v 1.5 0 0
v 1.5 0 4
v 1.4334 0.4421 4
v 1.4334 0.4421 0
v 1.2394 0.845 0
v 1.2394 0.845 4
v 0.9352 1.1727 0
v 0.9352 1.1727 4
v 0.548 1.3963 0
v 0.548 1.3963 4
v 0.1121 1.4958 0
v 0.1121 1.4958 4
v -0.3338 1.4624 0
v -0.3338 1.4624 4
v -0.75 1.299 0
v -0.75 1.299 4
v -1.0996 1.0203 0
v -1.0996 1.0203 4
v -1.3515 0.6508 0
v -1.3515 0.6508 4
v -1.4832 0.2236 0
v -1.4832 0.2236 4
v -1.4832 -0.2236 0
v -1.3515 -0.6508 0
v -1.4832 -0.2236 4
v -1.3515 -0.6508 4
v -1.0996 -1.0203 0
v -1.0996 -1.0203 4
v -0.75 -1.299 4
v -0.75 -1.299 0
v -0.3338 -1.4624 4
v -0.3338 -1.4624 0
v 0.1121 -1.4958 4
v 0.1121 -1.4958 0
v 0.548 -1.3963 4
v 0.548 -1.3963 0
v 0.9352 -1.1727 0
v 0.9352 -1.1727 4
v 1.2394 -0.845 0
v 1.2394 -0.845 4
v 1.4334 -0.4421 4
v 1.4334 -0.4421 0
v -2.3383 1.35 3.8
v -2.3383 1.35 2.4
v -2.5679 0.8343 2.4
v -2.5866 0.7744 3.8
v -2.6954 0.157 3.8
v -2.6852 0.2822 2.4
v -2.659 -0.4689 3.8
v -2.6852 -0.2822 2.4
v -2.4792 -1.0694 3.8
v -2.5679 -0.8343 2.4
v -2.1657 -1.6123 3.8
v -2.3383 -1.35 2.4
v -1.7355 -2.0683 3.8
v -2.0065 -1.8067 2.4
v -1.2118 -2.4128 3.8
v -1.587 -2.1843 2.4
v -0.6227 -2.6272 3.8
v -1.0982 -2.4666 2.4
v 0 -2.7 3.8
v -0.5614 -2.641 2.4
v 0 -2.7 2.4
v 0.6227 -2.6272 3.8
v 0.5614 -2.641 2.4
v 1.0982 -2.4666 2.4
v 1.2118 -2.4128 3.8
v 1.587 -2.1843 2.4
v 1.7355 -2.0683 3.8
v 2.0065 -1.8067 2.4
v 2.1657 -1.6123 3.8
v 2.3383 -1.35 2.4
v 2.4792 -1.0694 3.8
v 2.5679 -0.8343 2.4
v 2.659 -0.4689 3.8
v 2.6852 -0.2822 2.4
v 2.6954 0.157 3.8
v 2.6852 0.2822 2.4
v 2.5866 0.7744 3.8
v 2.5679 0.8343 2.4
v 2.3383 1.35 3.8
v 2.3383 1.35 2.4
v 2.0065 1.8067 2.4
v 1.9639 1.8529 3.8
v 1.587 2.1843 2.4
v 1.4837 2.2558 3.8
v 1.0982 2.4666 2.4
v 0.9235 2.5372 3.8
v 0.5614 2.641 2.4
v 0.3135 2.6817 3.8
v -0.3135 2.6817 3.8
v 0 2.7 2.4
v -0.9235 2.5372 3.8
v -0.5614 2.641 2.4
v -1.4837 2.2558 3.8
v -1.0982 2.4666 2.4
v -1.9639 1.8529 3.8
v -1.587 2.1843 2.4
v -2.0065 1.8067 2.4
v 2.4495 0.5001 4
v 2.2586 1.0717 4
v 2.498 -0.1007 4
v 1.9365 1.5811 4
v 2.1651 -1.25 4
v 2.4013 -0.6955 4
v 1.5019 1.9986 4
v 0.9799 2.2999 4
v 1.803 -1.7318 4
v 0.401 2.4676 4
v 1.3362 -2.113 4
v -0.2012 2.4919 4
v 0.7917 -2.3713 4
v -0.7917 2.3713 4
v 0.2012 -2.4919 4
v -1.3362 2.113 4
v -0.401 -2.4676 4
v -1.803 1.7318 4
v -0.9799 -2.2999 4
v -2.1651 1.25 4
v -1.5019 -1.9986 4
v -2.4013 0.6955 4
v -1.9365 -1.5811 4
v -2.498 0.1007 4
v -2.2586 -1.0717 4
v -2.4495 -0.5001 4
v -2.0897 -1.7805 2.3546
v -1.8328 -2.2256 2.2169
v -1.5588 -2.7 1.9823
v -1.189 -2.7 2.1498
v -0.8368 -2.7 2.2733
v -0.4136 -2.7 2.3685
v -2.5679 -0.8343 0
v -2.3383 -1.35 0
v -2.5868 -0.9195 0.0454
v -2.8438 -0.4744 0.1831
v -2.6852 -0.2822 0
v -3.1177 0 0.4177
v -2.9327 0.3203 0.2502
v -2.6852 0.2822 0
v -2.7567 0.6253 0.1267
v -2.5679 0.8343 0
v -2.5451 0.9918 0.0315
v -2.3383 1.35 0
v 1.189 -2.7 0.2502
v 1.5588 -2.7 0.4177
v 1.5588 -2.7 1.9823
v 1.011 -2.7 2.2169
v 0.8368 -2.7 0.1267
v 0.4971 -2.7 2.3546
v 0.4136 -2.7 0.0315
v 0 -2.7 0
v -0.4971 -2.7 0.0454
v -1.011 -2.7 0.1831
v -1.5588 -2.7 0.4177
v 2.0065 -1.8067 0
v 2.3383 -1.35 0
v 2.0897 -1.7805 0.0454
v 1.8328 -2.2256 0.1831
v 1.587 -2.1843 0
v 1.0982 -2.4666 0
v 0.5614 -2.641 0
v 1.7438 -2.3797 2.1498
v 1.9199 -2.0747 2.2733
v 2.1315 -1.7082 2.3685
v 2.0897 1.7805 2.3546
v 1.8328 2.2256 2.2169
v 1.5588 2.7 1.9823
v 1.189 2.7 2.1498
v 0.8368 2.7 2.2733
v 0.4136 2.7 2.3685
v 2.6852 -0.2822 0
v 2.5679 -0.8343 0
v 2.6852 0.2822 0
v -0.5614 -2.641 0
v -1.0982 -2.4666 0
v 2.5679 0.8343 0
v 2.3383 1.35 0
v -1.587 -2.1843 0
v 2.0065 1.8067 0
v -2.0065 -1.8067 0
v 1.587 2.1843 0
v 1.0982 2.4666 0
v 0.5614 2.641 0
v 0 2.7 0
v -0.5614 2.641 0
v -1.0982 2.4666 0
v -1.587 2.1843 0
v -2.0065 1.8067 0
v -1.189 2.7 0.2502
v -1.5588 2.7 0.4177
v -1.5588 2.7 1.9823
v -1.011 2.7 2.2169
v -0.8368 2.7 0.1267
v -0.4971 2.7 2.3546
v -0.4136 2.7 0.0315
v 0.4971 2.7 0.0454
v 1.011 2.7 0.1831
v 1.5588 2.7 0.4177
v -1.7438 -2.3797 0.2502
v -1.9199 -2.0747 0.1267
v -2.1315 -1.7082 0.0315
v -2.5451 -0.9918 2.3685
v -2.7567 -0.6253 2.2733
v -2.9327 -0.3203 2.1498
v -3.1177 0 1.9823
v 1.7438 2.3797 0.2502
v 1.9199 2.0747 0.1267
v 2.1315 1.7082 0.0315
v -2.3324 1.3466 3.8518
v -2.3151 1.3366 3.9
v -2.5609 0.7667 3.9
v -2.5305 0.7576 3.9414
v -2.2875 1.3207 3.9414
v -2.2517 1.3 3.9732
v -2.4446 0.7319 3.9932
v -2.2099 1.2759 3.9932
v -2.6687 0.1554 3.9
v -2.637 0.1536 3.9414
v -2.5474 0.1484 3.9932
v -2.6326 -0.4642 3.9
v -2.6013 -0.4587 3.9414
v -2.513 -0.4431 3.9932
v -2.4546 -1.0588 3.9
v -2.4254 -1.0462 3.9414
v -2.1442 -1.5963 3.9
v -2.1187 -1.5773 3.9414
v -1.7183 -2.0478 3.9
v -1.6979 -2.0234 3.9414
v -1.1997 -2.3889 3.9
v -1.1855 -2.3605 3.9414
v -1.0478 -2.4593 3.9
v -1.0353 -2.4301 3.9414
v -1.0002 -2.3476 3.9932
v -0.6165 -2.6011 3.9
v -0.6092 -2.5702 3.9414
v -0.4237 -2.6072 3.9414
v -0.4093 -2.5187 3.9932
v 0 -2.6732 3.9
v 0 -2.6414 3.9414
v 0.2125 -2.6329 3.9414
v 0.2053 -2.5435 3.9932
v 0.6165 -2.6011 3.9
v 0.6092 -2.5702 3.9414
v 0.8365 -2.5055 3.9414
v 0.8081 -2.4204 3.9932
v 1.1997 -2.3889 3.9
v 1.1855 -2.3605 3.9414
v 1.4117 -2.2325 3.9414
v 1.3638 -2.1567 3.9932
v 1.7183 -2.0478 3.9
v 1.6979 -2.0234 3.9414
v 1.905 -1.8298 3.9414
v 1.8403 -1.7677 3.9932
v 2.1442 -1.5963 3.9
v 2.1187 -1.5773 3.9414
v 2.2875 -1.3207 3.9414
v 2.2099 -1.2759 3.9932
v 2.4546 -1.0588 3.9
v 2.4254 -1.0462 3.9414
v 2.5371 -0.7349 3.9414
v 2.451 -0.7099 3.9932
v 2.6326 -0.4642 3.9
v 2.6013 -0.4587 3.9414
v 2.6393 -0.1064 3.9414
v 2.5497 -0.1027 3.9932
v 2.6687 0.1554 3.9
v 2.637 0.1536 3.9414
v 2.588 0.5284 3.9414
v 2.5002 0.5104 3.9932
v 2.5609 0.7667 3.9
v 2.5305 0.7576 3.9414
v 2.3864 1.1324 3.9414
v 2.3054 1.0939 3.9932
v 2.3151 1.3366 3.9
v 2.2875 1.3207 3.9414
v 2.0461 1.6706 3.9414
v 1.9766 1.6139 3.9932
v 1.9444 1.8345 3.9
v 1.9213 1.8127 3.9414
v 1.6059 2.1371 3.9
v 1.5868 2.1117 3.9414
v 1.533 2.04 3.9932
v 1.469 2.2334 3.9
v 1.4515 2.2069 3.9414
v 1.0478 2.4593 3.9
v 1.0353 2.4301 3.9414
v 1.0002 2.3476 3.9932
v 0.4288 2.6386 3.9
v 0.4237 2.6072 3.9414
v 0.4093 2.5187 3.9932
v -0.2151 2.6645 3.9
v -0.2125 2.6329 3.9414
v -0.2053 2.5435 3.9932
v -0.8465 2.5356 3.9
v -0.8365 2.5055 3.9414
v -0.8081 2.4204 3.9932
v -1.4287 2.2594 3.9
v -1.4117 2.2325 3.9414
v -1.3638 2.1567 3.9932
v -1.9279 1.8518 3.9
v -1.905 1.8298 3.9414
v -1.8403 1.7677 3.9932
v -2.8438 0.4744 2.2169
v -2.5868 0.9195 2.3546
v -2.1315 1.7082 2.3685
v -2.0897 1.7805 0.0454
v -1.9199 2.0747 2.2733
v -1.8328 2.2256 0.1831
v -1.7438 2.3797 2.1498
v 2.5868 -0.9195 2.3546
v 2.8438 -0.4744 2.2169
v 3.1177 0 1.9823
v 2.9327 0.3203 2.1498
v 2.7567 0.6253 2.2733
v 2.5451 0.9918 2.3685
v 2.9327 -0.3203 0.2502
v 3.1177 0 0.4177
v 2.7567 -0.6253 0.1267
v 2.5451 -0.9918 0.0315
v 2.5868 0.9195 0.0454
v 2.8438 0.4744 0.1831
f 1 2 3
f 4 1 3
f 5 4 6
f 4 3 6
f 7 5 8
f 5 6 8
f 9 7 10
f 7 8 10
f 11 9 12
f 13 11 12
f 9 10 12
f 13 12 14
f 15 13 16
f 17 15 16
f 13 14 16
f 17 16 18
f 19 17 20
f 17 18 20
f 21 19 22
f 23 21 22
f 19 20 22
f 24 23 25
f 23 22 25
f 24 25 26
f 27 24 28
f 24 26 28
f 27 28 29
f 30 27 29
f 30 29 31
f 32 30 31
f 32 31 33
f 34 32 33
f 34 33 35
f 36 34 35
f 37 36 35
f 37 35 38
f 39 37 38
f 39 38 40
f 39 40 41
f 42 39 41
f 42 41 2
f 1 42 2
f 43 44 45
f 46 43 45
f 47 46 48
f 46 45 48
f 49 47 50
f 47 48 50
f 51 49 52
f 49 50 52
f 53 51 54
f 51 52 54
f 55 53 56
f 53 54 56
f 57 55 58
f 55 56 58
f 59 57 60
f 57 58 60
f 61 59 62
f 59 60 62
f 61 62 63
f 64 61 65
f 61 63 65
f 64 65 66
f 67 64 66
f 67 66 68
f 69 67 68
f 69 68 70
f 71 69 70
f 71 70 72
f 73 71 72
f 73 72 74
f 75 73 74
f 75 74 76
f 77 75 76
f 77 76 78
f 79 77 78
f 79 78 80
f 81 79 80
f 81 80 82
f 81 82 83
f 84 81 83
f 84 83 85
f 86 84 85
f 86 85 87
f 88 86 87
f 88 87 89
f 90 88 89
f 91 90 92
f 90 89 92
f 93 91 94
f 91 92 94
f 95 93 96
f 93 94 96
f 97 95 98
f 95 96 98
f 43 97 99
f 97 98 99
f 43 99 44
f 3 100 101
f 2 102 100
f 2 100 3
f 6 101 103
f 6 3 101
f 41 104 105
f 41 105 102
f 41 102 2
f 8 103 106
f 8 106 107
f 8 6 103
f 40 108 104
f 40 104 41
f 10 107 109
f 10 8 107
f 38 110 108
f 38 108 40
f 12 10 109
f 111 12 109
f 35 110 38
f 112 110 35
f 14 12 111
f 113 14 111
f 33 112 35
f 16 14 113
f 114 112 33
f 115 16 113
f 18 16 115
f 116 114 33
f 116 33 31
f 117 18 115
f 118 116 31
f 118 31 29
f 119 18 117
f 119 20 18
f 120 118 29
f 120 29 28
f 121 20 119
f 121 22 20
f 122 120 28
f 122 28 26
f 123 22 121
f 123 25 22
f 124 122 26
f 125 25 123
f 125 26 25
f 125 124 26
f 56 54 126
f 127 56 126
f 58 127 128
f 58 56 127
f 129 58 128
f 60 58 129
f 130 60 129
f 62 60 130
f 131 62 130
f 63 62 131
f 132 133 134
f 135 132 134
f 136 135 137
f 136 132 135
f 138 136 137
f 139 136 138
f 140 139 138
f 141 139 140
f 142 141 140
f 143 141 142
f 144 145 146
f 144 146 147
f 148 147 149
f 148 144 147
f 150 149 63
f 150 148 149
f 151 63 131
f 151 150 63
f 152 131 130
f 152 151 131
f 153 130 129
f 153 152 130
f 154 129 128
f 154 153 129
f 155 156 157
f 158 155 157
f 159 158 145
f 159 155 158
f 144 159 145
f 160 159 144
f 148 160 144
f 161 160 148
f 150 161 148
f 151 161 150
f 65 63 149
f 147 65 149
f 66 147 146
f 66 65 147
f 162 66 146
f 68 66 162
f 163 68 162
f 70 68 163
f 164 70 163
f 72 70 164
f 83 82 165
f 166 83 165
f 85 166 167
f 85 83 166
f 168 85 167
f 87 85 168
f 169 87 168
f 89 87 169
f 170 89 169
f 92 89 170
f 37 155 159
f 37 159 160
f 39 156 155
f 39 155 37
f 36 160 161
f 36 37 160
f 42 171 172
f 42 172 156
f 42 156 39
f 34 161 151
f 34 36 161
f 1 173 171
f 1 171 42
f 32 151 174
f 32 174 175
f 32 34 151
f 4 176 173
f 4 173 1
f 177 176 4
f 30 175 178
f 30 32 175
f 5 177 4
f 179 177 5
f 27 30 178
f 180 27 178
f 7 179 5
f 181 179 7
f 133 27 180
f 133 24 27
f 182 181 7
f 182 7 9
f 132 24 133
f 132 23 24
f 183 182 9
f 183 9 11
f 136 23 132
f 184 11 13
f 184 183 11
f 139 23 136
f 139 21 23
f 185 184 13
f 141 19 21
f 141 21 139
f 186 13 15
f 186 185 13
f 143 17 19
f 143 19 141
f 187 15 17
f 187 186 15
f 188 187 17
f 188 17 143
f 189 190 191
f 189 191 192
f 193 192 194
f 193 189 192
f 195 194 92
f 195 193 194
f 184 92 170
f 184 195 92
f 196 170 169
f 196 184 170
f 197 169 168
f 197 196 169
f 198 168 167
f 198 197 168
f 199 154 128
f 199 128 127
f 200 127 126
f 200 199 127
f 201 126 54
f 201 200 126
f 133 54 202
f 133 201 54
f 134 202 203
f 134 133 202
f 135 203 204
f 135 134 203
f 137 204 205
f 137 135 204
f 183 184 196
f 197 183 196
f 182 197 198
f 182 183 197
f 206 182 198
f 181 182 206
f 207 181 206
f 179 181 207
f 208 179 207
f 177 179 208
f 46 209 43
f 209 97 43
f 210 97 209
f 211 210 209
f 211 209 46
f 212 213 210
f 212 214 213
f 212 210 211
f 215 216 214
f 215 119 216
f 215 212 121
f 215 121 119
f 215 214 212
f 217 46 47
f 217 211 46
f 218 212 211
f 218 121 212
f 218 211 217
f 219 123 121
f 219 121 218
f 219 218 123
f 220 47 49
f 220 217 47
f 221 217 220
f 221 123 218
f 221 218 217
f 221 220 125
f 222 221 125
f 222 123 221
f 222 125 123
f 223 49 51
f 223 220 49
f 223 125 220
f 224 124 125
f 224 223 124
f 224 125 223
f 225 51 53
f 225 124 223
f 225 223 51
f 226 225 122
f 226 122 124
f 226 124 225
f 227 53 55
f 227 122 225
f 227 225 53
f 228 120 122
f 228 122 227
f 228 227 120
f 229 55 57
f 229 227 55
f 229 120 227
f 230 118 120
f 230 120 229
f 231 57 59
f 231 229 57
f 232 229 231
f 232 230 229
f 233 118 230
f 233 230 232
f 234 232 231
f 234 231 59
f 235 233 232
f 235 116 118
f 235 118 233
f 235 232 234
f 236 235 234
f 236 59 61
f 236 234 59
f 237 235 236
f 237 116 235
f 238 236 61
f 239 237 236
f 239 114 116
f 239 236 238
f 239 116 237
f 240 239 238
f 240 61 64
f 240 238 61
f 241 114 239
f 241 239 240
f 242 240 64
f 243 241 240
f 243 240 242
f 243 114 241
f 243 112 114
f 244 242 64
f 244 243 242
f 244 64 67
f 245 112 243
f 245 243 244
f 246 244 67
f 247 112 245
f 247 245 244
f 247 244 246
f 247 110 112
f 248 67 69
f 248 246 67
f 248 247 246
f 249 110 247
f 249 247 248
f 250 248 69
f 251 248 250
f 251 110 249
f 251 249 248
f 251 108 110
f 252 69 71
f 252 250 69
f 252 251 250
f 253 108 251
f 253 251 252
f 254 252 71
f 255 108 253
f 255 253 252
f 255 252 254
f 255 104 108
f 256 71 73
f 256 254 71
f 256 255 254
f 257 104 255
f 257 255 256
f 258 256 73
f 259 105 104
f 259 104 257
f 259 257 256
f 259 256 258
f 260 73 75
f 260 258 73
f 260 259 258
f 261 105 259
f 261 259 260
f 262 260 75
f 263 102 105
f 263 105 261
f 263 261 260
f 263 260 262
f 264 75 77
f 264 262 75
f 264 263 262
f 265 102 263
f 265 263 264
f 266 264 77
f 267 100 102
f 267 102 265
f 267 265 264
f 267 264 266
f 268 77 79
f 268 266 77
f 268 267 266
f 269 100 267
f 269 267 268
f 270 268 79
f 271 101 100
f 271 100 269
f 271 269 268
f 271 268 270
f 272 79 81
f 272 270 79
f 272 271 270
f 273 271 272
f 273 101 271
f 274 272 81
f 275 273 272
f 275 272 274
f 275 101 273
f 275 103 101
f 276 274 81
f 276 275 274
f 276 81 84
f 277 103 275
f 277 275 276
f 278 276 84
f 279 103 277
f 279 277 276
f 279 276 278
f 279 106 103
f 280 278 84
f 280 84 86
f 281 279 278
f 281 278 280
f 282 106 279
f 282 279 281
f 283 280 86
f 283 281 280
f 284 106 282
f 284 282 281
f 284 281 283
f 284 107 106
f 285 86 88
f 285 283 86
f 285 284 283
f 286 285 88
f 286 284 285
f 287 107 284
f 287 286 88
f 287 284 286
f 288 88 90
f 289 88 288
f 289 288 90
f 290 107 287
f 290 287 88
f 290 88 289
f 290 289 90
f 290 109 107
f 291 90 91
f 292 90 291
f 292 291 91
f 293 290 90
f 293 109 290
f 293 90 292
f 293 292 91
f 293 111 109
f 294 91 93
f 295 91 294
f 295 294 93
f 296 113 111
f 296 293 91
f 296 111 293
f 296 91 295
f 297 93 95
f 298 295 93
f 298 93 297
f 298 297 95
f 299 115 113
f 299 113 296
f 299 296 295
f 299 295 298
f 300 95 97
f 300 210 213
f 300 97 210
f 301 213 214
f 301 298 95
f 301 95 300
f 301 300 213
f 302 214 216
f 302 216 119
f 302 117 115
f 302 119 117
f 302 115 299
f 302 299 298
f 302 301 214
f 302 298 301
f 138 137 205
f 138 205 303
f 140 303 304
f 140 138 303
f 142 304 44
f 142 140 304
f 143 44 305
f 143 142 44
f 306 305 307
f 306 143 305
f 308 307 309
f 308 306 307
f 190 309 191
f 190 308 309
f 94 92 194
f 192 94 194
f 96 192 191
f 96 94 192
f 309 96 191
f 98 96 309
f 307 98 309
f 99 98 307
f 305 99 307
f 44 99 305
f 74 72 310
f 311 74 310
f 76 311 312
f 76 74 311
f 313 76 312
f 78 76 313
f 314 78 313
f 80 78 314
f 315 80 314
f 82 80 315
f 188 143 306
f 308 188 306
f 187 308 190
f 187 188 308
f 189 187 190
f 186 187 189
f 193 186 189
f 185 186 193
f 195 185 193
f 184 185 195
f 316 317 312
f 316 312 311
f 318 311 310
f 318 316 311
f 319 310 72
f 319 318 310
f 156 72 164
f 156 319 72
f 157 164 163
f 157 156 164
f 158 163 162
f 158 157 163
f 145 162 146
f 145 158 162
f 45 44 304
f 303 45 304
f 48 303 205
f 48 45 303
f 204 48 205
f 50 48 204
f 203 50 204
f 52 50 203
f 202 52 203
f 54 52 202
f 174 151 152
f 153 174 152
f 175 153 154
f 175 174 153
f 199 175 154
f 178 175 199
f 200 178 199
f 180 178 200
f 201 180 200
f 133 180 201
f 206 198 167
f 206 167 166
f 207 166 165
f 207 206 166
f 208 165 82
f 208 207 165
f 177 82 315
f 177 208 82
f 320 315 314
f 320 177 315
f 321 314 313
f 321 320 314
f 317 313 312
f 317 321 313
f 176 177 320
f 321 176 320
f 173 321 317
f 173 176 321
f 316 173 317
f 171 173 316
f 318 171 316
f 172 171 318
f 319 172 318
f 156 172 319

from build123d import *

# Parameters (mm, degrees)
EXTRUDE_1_DEPTH     = 2.4
SKETCH_2_OUTSIDE_W  = 17.954
SKETCH_2_OUTSIDE_H  = 17.118
SKETCH_2_OUTSIDE_R  = 2.7
CUT_EXTRUDE_1_DEPTH = 4
CUT_EXTRUDE_1_DRAFT = -45
SKETCH_3_OUTSIDE_W  = 17.954
SKETCH_3_OUTSIDE_H  = 17.118
SKETCH_3_OUTSIDE_R  = 2.7
CUT_EXTRUDE_2_DEPTH = 4
CUT_EXTRUDE_2_DRAFT = -45
SKETCH_3_2_R        = 2.7
EXTRUDE_2_DEPTH     = 1.6
FILLET_1_R          = 0.2
SKETCH_4_R          = 1.5
CUT_EXTRUDE_3_DEPTH = 6.745432969


with BuildPart() as part:
    # 草图1 → 凸台-拉伸1 (new body)
    with BuildSketch(Plane.XY):
        Polygon((-1.558845727, 2.7), (1.558845727, 2.7), (3.117691454, 0), (1.558845727, -2.7), (-1.558845727, -2.7), (-3.117691454, 0), align=None)
    extrude(amount=EXTRUDE_1_DEPTH)


with BuildPart() as cut_extrude_1_tool:
    # 草图2 outside → 切除-拉伸1 (with draft: the straight prism first)
    with BuildSketch(Plane(origin=(0, 0, 0), x_dir=(-1, 0, 0), z_dir=(0, 0, -1))):
        Rectangle(SKETCH_2_OUTSIDE_W, SKETCH_2_OUTSIDE_H)
        Circle(SKETCH_2_OUTSIDE_R, mode=Mode.SUBTRACT)
    extrude(amount=-CUT_EXTRUDE_1_DEPTH)
    # 切除-拉伸1: the draft: its side faces are tilted about the plane it starts from
    cut_extrude_1_sides = [cut_extrude_1_tool.faces().sort_by_distance(p)[0] for p in [
        (0, -8.559, 2),
        (-8.977, 0, 2),
        (0, 8.559, 2),
        (8.977, 0, 2),
        (2.7, 0, 2),
    ]]
    draft(cut_extrude_1_sides, Plane(origin=(0, 0, 0), x_dir=(-1, 0, 0), z_dir=(0, 0, -1)), CUT_EXTRUDE_1_DRAFT)


with BuildPart() as part_1:
    add(part.part)

    # 切除-拉伸1: cut by cut_extrude_1_tool
    add(cut_extrude_1_tool.part, mode=Mode.SUBTRACT)


with BuildPart() as cut_extrude_2_tool:
    # 草图3 outside → 切除-拉伸2 (with draft: the straight prism first)
    with BuildSketch(Plane.XY.offset(2.4)):
        Rectangle(SKETCH_3_OUTSIDE_W, SKETCH_3_OUTSIDE_H)
        Circle(SKETCH_3_OUTSIDE_R, mode=Mode.SUBTRACT)
    extrude(amount=-CUT_EXTRUDE_2_DEPTH)
    # 切除-拉伸2: the draft: its side faces are tilted about the plane it starts from
    cut_extrude_2_sides = [cut_extrude_2_tool.faces().sort_by_distance(p)[0] for p in [
        (0, -8.559, 0.4),
        (8.977, 0, 0.4),
        (0, 8.559, 0.4),
        (-8.977, 0, 0.4),
        (-2.7, 0, 0.4),
    ]]
    draft(cut_extrude_2_sides, Plane.XY.offset(2.4), CUT_EXTRUDE_2_DRAFT)


with BuildPart() as part_2:
    add(part_1.part)

    # 切除-拉伸2: cut by cut_extrude_2_tool
    add(cut_extrude_2_tool.part, mode=Mode.SUBTRACT)

    # 草图3<2> → 凸台-拉伸2 (add)
    with BuildSketch(Plane.XY.offset(2.4)):
        Circle(SKETCH_3_2_R)
    extrude(amount=EXTRUDE_2_DEPTH)

    # 圆角1
    fillet_1_edges = [part_2.edges().sort_by_distance(p)[0] for p in [
        (-2.7, 0, 4),
    ]]
    fillet(fillet_1_edges, radius=FILLET_1_R)

    # 草图4 → 切除-拉伸3 (cut, through all)
    with BuildSketch(Plane.XY.offset(4)):
        Circle(SKETCH_4_R)
    extrude(amount=-CUT_EXTRUDE_3_DEPTH, mode=Mode.SUBTRACT)


solid = part_2.part
